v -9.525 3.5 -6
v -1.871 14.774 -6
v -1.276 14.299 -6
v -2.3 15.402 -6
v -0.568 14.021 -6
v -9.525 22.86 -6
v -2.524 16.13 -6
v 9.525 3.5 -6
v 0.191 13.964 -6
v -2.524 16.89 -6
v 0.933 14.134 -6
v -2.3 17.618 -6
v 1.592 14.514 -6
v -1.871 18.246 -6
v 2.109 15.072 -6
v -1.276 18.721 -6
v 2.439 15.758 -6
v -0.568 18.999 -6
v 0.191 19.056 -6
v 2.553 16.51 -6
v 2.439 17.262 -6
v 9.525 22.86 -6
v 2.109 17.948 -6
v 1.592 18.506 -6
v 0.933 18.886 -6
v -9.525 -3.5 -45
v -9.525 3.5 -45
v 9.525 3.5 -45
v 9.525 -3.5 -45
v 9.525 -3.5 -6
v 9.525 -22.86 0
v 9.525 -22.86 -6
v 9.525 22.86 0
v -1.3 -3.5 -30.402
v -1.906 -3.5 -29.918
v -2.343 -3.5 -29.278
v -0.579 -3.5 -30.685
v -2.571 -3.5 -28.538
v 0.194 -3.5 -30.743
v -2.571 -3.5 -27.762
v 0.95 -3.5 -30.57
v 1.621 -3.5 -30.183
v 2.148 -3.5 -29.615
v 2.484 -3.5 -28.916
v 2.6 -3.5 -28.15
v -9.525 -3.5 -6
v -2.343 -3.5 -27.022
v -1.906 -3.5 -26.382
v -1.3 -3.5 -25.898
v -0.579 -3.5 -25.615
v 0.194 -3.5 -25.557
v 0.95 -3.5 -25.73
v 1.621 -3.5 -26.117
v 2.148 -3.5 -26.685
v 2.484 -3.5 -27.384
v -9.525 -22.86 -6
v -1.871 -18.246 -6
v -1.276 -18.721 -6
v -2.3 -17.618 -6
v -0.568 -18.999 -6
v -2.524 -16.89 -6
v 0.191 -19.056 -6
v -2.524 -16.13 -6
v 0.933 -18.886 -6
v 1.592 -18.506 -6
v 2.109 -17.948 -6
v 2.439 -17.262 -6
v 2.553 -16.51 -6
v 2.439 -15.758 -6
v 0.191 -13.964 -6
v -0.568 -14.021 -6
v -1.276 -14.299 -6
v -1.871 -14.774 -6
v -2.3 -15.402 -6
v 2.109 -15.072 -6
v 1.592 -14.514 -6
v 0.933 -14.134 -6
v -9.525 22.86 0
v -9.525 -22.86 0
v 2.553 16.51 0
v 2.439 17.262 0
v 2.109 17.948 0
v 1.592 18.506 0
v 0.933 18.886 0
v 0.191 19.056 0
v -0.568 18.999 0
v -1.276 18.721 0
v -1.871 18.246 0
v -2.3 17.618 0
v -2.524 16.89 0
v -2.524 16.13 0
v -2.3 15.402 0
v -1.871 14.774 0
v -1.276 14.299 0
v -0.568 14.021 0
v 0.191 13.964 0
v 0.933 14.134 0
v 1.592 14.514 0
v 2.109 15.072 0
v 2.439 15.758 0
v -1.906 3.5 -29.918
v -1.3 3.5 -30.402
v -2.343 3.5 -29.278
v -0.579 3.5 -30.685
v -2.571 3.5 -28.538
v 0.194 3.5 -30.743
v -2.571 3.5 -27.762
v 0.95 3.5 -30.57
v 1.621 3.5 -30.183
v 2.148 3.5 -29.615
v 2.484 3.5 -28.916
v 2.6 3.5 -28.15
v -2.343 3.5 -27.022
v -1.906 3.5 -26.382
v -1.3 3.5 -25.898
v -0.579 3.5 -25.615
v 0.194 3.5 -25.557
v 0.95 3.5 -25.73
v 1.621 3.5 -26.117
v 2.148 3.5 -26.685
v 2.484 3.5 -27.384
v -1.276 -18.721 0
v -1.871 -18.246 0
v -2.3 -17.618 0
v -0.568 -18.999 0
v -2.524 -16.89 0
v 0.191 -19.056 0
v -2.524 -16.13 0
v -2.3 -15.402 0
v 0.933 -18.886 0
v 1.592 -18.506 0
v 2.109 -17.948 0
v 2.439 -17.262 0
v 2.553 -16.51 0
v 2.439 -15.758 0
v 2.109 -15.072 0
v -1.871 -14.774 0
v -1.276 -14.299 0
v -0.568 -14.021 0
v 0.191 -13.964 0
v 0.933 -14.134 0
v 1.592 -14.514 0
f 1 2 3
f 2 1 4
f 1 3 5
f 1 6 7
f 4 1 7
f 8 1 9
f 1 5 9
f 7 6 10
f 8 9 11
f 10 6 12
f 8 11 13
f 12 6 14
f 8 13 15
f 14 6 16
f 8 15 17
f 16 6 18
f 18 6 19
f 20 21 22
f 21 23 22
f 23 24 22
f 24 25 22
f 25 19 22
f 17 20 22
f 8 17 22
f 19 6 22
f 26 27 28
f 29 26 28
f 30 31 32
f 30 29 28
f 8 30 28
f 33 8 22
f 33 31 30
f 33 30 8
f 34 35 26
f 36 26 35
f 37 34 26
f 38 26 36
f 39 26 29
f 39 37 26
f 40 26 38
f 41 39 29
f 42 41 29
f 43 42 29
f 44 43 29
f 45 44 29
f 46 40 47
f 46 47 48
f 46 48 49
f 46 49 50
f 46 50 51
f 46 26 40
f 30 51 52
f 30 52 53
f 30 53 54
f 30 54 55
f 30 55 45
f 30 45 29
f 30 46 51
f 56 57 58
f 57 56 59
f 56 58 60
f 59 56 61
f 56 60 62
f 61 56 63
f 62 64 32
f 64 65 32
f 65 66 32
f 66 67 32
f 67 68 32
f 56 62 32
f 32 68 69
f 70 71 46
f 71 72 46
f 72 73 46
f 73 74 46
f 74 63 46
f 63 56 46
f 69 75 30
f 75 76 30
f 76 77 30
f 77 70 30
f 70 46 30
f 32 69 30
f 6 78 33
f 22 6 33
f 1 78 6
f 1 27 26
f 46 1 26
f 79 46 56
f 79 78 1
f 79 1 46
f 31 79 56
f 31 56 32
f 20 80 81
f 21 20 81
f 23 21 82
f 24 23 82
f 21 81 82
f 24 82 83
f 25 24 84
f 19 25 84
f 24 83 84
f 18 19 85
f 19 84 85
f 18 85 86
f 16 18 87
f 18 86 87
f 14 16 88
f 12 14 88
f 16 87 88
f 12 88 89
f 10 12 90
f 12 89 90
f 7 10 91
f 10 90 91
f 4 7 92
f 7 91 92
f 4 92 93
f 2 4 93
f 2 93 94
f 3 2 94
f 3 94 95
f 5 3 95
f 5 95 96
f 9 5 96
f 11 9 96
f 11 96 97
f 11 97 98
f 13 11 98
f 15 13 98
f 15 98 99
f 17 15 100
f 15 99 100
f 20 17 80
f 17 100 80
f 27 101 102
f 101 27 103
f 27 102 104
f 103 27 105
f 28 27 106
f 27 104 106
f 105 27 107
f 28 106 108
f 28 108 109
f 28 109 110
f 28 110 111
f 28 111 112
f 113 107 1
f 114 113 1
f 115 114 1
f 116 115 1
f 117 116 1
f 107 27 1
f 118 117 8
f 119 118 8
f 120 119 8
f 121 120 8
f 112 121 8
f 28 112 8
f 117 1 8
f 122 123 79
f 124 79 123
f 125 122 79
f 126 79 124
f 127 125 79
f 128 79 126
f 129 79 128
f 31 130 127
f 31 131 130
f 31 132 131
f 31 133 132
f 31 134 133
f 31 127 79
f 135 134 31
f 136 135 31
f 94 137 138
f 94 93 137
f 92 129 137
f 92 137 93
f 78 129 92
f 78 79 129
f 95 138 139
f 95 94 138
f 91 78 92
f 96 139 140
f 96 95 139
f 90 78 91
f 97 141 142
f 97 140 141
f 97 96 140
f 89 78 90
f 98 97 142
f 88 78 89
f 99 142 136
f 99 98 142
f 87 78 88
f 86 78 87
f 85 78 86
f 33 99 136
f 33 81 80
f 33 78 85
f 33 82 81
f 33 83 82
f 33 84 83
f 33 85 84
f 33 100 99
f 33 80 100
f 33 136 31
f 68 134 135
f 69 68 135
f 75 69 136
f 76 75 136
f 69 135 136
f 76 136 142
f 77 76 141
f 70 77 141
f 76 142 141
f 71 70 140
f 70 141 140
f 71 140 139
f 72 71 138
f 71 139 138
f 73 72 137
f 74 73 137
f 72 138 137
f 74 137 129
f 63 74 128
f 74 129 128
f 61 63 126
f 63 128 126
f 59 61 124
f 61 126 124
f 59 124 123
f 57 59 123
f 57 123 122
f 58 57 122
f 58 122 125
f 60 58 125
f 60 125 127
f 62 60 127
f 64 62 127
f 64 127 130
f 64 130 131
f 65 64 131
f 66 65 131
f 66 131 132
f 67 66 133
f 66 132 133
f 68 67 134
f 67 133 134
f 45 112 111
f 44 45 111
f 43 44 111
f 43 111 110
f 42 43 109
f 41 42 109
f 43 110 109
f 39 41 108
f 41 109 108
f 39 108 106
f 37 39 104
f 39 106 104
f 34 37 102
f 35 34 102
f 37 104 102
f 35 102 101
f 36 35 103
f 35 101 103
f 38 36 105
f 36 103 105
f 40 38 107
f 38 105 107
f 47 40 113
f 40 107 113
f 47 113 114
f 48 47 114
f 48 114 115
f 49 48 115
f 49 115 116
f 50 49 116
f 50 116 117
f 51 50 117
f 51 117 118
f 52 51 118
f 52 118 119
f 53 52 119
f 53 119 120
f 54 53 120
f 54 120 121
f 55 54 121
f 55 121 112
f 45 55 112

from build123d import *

# Parameters (mm, degrees)
SKETCH1_W           = 19.05
SKETCH1_H           = 19.36
SKETCH1_R           = 2.5527
SKETCH1_H_2         = 7
BOSS_EXTRUDE1_DEPTH = 6
SKETCH3_W           = 19.05
SKETCH3_H           = 7
BOSS_EXTRUDE2_DEPTH = 45
SKETCH4_R           = 2.6
CUT_EXTRUDE1_DEPTH  = 27.36


with BuildPart() as part:
    # Sketch1 → Boss-Extrude1 (new body)
    with BuildSketch(Plane.XY):
        with Locations((0, 13.18)):
            Rectangle(SKETCH1_W, SKETCH1_H)
        with Locations((0, 16.51)):
            Circle(SKETCH1_R, mode=Mode.SUBTRACT)
        with Locations((0, -13.18)):
            Rectangle(SKETCH1_W, SKETCH1_H)
        with Locations((0, -16.51)):
            Circle(SKETCH1_R, mode=Mode.SUBTRACT)
        Rectangle(SKETCH1_W, SKETCH1_H_2)
    extrude(amount=-BOSS_EXTRUDE1_DEPTH)

    # Sketch3 → Boss-Extrude2 (add)
    with BuildSketch(Plane.XY):
        Rectangle(SKETCH3_W, SKETCH3_H)
    extrude(amount=-BOSS_EXTRUDE2_DEPTH)

    # Sketch4 → Cut-Extrude1 (cut, through all)
    with BuildSketch(Plane(origin=(0, 3.5, 0), x_dir=(1, 0, 0), z_dir=(0, 1, 0))):
        with Locations((0, 28.15)):
            Circle(SKETCH4_R)
    extrude(amount=-CUT_EXTRUDE1_DEPTH, mode=Mode.SUBTRACT)


solid = part.part
